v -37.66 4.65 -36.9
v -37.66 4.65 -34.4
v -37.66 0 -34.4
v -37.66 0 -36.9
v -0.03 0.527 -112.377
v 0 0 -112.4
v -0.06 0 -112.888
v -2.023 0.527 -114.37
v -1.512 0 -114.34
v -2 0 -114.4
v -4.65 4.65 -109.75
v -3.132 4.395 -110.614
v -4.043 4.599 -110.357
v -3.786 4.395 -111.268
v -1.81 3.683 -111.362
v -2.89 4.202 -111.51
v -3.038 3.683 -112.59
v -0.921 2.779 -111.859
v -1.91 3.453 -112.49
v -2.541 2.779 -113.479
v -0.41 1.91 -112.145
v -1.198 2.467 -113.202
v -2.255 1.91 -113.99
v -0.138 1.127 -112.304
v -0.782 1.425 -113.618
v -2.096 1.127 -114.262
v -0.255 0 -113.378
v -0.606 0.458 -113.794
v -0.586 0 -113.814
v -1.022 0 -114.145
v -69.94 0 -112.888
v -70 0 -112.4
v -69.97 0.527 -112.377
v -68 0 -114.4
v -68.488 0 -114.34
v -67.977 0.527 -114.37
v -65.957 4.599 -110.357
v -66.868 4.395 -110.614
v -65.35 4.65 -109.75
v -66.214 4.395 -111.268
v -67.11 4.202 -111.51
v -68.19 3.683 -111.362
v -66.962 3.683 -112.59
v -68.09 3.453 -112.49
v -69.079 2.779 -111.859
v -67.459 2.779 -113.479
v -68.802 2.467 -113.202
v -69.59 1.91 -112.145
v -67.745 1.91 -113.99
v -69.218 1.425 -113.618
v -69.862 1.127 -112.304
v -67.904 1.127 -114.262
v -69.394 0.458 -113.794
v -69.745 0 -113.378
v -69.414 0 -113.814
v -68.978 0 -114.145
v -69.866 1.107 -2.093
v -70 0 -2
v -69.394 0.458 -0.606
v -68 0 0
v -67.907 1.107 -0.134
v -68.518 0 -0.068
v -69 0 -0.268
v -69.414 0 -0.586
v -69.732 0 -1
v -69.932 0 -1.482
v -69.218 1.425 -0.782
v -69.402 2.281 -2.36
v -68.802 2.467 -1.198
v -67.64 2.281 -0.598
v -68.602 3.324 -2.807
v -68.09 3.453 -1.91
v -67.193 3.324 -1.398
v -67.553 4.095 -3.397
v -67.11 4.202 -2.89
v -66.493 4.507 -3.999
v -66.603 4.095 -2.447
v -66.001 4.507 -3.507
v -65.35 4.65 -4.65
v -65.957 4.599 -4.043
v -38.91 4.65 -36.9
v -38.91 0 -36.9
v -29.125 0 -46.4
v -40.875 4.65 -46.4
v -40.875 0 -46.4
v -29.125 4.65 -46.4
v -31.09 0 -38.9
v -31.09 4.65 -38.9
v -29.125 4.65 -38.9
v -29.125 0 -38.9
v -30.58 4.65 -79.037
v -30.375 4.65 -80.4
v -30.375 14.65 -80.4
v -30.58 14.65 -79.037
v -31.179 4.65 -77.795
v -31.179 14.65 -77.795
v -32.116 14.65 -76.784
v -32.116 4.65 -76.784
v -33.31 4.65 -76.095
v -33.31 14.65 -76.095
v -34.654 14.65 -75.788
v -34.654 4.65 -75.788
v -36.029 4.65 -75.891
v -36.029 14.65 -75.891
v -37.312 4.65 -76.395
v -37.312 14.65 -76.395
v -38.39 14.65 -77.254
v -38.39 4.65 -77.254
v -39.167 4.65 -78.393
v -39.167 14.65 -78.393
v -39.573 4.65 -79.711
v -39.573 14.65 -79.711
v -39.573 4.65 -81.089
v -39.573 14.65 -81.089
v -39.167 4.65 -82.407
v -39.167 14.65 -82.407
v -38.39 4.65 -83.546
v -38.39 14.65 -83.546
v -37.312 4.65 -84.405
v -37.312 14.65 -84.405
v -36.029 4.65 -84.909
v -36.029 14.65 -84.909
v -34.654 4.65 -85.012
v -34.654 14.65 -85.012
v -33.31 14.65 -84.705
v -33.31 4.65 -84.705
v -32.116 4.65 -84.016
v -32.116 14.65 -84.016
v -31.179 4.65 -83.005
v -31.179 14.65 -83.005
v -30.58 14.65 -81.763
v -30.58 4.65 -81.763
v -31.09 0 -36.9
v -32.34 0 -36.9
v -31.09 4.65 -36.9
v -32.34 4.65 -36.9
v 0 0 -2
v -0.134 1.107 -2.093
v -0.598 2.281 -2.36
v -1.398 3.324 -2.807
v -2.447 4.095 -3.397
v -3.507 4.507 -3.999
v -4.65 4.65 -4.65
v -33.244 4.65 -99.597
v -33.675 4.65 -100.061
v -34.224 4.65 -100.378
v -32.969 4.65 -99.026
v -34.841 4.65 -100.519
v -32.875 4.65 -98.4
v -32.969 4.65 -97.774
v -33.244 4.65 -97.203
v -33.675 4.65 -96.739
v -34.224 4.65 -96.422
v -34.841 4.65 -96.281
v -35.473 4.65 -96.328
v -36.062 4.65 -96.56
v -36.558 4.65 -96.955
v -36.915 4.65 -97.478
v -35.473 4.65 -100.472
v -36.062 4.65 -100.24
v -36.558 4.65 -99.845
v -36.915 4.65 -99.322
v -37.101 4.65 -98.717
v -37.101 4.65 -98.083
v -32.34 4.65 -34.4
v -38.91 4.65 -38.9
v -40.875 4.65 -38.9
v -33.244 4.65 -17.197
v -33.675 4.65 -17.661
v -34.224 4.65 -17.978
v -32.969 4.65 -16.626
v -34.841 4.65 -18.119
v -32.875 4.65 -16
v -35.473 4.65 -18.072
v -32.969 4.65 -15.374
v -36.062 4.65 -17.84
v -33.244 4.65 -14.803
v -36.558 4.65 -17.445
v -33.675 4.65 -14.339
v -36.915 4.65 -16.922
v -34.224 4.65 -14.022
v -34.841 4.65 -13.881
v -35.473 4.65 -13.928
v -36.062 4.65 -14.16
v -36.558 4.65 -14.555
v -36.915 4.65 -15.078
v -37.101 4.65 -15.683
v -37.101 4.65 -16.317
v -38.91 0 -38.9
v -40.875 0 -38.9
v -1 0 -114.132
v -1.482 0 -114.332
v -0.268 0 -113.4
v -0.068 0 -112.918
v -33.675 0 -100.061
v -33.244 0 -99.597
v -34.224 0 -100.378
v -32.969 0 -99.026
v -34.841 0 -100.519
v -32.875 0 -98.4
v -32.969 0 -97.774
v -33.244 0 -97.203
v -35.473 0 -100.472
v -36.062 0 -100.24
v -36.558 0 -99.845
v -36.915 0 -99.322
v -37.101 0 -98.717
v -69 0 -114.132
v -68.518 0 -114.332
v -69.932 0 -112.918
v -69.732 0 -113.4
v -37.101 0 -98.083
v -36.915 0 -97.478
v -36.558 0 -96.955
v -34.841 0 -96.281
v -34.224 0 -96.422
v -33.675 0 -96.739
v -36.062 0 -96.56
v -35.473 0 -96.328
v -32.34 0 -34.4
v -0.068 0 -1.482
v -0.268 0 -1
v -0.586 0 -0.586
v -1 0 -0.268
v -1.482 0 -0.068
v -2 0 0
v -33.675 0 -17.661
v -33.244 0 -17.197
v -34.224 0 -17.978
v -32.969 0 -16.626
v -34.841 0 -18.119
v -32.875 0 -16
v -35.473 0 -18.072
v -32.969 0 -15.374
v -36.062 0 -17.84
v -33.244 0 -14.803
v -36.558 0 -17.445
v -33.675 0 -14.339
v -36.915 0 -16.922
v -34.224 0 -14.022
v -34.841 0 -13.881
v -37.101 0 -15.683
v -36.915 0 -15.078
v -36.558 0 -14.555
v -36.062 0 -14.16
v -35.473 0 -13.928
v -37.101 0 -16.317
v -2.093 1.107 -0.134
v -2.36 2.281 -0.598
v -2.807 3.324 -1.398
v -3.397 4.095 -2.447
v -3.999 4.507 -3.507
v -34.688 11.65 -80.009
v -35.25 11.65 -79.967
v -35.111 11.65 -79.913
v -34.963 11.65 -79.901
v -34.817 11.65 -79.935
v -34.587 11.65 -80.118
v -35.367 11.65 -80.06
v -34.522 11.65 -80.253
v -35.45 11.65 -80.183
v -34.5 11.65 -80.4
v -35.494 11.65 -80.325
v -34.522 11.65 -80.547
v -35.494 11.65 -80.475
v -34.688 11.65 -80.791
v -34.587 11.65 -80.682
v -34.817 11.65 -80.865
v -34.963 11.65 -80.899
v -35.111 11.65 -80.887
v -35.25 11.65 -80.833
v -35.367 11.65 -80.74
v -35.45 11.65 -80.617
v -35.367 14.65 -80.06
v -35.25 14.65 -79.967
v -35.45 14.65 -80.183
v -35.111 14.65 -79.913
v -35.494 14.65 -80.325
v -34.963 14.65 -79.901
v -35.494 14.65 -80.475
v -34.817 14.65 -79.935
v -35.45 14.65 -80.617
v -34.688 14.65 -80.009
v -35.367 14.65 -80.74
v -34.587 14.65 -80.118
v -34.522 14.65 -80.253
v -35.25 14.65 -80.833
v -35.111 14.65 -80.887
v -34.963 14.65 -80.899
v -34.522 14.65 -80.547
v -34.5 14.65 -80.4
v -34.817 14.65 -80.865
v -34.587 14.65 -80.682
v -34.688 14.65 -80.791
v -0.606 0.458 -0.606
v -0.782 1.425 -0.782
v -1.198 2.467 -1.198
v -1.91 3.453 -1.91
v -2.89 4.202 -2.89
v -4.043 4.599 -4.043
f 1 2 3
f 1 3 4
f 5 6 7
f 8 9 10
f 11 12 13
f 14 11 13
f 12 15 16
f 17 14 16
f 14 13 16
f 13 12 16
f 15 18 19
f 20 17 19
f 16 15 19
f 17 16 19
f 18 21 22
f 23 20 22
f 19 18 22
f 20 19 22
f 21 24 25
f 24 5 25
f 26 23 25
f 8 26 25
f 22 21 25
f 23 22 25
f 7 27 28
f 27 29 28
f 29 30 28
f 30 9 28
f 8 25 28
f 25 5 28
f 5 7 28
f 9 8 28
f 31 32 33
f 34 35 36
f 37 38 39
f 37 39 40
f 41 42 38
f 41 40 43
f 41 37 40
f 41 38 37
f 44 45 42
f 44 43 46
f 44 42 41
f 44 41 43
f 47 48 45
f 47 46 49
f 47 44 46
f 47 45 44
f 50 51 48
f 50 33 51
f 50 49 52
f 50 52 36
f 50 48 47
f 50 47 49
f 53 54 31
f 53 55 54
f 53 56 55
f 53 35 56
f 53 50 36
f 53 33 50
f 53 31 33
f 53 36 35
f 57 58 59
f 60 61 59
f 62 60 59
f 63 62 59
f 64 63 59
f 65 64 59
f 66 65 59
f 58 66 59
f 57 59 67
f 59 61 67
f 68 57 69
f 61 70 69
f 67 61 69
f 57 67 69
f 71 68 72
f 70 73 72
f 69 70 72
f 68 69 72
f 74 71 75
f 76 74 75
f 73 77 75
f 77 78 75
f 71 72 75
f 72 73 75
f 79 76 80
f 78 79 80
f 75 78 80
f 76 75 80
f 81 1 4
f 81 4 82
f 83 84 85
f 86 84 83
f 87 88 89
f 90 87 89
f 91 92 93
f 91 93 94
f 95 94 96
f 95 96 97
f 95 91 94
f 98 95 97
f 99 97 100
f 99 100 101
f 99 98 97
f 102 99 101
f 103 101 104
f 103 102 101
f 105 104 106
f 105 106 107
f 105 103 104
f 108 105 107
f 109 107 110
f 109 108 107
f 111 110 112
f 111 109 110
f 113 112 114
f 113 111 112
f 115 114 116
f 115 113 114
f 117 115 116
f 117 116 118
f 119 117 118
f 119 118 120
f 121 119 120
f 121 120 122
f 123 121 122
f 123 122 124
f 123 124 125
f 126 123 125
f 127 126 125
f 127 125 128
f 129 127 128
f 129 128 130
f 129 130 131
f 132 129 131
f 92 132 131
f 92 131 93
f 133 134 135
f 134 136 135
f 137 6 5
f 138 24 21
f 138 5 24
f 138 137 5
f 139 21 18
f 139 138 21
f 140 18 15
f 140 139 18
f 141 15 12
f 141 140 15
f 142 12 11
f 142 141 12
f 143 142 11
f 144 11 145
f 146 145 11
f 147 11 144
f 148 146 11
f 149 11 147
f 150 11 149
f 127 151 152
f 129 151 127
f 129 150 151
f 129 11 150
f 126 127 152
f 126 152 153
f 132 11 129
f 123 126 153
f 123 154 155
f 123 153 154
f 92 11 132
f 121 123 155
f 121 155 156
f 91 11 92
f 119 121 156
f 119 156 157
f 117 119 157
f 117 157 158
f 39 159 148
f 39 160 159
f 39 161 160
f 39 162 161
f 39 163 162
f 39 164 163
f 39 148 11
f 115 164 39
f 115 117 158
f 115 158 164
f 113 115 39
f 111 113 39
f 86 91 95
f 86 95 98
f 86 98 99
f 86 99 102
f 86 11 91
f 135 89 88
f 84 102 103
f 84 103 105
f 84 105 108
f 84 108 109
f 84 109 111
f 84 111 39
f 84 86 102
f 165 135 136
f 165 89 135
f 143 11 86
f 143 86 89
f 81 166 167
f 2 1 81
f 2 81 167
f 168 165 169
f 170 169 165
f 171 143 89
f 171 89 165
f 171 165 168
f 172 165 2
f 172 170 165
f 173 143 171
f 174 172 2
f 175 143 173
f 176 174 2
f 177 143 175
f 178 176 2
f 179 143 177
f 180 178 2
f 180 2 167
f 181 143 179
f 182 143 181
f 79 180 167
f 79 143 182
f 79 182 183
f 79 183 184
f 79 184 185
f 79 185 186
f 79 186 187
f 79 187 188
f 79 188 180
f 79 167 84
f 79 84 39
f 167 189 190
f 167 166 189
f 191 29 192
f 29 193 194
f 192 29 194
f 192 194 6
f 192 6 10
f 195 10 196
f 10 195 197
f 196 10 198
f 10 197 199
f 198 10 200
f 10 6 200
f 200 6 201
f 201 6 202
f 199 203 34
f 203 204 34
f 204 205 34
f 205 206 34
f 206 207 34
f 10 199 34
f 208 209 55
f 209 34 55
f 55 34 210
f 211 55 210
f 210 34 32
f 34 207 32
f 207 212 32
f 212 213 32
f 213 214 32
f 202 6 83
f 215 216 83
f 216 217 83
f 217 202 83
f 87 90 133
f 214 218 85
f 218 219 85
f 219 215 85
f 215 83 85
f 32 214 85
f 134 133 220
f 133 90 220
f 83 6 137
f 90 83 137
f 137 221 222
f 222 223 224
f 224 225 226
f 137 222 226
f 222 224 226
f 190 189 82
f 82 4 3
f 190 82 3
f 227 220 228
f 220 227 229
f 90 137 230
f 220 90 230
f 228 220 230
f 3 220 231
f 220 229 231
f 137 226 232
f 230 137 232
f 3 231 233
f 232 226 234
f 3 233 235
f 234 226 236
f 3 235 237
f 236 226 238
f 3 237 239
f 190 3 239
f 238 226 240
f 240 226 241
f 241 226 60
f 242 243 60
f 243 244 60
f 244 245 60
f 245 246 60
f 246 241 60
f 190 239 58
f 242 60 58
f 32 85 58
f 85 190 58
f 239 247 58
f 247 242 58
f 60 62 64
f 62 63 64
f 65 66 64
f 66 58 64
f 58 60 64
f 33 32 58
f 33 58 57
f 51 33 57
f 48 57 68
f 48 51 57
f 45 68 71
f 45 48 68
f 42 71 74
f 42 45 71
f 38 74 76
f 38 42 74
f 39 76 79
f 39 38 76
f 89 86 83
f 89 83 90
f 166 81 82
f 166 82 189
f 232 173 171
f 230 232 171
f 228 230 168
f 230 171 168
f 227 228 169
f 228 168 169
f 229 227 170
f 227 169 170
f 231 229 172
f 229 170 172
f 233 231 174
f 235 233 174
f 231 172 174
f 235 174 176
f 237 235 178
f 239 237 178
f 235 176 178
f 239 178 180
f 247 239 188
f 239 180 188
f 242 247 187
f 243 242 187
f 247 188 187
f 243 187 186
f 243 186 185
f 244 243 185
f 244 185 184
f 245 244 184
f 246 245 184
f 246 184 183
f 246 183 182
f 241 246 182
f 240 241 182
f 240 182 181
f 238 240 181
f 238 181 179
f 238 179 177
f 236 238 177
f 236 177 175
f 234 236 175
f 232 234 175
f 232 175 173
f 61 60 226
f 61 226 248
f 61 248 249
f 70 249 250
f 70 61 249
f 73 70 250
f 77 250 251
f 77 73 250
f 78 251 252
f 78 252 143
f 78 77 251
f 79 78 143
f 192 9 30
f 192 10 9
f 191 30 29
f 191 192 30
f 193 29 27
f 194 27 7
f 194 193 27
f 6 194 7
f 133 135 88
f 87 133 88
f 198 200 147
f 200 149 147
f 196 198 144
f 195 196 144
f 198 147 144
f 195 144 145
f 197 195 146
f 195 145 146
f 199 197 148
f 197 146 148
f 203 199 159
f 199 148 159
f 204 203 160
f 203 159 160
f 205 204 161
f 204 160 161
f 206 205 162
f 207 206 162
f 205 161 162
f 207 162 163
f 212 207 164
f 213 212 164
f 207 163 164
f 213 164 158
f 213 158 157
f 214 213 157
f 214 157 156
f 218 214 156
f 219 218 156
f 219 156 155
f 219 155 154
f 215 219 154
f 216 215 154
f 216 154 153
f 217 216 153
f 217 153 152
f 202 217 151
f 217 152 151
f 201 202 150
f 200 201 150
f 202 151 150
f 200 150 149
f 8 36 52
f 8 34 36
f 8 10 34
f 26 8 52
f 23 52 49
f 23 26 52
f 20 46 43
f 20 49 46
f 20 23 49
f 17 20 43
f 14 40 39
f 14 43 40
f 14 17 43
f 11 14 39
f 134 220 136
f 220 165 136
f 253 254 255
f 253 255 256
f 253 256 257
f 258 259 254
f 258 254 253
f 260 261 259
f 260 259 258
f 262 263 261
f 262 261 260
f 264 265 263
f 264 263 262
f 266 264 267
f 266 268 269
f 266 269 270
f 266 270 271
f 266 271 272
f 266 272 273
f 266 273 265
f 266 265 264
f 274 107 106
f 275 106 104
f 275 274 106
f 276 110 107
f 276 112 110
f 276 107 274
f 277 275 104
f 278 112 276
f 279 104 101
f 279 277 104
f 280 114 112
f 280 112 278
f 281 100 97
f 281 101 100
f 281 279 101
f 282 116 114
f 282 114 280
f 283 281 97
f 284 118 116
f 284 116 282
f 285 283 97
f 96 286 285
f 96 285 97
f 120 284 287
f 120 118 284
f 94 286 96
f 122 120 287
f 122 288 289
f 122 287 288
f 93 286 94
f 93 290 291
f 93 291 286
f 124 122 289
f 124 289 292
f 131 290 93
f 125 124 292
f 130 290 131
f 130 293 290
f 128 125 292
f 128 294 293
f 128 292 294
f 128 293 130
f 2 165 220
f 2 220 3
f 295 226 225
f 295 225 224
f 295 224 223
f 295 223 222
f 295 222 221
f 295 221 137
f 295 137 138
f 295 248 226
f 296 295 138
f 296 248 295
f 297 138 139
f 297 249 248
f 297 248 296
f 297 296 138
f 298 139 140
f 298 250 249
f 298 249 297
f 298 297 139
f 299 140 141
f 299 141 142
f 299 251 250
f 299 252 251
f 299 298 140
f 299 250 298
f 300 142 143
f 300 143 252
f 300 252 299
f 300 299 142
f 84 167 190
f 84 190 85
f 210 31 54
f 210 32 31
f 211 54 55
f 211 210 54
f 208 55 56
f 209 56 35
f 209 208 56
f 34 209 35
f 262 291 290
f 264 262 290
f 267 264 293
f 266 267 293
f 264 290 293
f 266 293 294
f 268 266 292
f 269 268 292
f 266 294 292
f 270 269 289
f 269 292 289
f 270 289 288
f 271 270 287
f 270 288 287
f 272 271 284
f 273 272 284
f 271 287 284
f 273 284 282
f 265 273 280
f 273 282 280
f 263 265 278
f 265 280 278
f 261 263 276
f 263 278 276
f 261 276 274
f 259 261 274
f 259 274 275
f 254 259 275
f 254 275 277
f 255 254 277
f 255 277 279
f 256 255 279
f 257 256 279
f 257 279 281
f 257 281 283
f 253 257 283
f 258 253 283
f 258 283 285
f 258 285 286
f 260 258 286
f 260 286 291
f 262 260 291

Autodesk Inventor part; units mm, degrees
ref_plane "YZ Plane" through (0, 0, 0) normal (1, 0, 0) x (0, 1, 0)
ref_plane "XZ Plane" through (0, 0, 0) normal (0, 1, 0) x (-1, 0, 0)
ref_plane "XY Plane" through (0, 0, 0) normal (0, 0, 1) x (1, 0, 0)
sketch "Sketch1" plane through (0, 0, 0) normal (0, 1, 0) x (-1, 0, 0)
  line L0 (0, 0) -> (70, 0)
  line L1 (70, 0) -> (70, -114.4)
  line L2 (70, -114.4) -> (0, -114.4)
  line L3 (0, -114.4) -> (0, 0)
  dimension "d0" = 70
  dimension "d1" = 114.4
extrude "Extrusion1" add sketch "Sketch1" along normal blind 4.65
sketch "Sketch2" plane through (0, 4.65, 0) normal (0, 1, 0) x (1, 0, 0)
  line L0 (-70, 0) -> (0, 0) projected
  line L1 (0, 0) -> (-35, 0)
  line L2 (-35, 0) -> (-35, 16)
  circle A0 centre (-35, 16) radius 2.125
  line L3 (0, 0) -> (0, 114.4) projected
  line L4 (0, 0) -> (0, 114.4)
  line L5 (0, 57.2) -> (13.6816, 57.2)
  circle A1 centre (-35, 98.4) radius 2.125
  dimension "d4" = 35
  dimension "d5" = 16
  dimension "d6" = 90
  dimension "d7" = 4.25
extrude "Extrusion2" cut sketch "Sketch2" against normal blind 10
fillet "Fillet1" radius 4.65 4 edges at (-35, 4.65, -114.4) (0, 4.65, -57.2) (-35, 4.65, 0) (-70, 4.65, -57.2)
fillet "Fillet2" radius 2 4 edges at (-1.3618, 3.2882, -1.3618) (-68.6382, 3.2882, -1.3618) (-68.6382, 3.2882, -113.0382) (-1.3618, 3.2882, -113.0382)
sketch "Sketch3" plane through (0, 4.65, 0) normal (0, 1, 0) x (1, 0, 0)
  line L0 (0, 0) -> (0, 34.4)
  line L1 (0, 2) -> (0, 112.4) projected
  line L2 (0, 34.4) -> (-70, 34.4)
  line L3 (-70, 112.4) -> (-70, 2) projected
  line L4 (-35, 34.4) -> (-29.125, 34.4)
  line L5 (-29.125, 34.4) -> (-40.875, 34.4)
  line L6 (-40.875, 34.4) -> (-40.875, 46.4)
  line L7 (-40.875, 46.4) -> (-29.125, 46.4)
  line L8 (-29.125, 46.4) -> (-29.125, 34.4)
  line L9 (-35, 34.4) -> (-32.34, 34.4)
  line L10 (-32.34, 34.4) -> (-32.34, 36.9)
  line L11 (-32.34, 36.9) -> (-31.09, 36.9)
  line L12 (-31.09, 36.9) -> (-31.09, 38.9)
  line L13 (-31.09, 38.9) -> (-28.2521, 38.9)
  line L14 (-35, 34.4) -> (-35, 32.315)
  line L15 (-37.66, 34.4) -> (-37.66, 36.9)
  line L16 (-37.66, 36.9) -> (-38.91, 36.9)
  line L17 (-38.91, 36.9) -> (-38.91, 38.9)
  line L18 (-38.91, 38.9) -> (-41.7479, 38.9)
  point P0 (-40.875, 38.9)
  point P1 (-29.125, 38.9)
  dimension "d12" = 34.4
  dimension "d13" = 70
  dimension "d14" = 5.875
  dimension "d15" = 11.75
  dimension "d16" = 12
  dimension "d17" = 2.66
  dimension "d18" = 2.5
  dimension "d19" = 1.25
  dimension "d20" = 2
extrude "Extrusion3" cut sketch "Sketch3" against normal blind 10 contours L2 L15 L16 L17 L18 L6 L7 L8 L13 L12 L11 L10
sketch "Sketch4" plane through (0, 4.65, 0) normal (0, 1, 0) x (1, 0, 0)
  line L0 (0, 0) -> (0, 114.4)
  line L1 (0, 2) -> (0, 112.4) projected
  line L2 (0, 114.4) -> (-35, 114.4)
  line L3 (-2, 114.4) -> (-68, 114.4) projected
  line L4 (-35, 114.4) -> (-35, 80.4)
  circle A0 centre (-35, 80.4) radius 4.625
  dimension "d23" = 114.4
  dimension "d24" = 34
  dimension "d25" = 9.25
extrude "Extrusion4" add sketch "Sketch4" along normal blind 10
thread "Thread1" size "M10x1.5" class "6g" standard "ANSI Metric M Profile" full length
sketch "Sketch5" plane through (-35, 14.65, -80.4) normal (0, 1, 0) x (1, 0, 0)
  circle A0 centre (0, 0) radius 0.5
  point P0 (35, -80.4)
  dimension "d30" = 1
extrude "Extrusion5" cut sketch "Sketch5" against normal blind 3
properties part number "ethernet_coax_plug"
